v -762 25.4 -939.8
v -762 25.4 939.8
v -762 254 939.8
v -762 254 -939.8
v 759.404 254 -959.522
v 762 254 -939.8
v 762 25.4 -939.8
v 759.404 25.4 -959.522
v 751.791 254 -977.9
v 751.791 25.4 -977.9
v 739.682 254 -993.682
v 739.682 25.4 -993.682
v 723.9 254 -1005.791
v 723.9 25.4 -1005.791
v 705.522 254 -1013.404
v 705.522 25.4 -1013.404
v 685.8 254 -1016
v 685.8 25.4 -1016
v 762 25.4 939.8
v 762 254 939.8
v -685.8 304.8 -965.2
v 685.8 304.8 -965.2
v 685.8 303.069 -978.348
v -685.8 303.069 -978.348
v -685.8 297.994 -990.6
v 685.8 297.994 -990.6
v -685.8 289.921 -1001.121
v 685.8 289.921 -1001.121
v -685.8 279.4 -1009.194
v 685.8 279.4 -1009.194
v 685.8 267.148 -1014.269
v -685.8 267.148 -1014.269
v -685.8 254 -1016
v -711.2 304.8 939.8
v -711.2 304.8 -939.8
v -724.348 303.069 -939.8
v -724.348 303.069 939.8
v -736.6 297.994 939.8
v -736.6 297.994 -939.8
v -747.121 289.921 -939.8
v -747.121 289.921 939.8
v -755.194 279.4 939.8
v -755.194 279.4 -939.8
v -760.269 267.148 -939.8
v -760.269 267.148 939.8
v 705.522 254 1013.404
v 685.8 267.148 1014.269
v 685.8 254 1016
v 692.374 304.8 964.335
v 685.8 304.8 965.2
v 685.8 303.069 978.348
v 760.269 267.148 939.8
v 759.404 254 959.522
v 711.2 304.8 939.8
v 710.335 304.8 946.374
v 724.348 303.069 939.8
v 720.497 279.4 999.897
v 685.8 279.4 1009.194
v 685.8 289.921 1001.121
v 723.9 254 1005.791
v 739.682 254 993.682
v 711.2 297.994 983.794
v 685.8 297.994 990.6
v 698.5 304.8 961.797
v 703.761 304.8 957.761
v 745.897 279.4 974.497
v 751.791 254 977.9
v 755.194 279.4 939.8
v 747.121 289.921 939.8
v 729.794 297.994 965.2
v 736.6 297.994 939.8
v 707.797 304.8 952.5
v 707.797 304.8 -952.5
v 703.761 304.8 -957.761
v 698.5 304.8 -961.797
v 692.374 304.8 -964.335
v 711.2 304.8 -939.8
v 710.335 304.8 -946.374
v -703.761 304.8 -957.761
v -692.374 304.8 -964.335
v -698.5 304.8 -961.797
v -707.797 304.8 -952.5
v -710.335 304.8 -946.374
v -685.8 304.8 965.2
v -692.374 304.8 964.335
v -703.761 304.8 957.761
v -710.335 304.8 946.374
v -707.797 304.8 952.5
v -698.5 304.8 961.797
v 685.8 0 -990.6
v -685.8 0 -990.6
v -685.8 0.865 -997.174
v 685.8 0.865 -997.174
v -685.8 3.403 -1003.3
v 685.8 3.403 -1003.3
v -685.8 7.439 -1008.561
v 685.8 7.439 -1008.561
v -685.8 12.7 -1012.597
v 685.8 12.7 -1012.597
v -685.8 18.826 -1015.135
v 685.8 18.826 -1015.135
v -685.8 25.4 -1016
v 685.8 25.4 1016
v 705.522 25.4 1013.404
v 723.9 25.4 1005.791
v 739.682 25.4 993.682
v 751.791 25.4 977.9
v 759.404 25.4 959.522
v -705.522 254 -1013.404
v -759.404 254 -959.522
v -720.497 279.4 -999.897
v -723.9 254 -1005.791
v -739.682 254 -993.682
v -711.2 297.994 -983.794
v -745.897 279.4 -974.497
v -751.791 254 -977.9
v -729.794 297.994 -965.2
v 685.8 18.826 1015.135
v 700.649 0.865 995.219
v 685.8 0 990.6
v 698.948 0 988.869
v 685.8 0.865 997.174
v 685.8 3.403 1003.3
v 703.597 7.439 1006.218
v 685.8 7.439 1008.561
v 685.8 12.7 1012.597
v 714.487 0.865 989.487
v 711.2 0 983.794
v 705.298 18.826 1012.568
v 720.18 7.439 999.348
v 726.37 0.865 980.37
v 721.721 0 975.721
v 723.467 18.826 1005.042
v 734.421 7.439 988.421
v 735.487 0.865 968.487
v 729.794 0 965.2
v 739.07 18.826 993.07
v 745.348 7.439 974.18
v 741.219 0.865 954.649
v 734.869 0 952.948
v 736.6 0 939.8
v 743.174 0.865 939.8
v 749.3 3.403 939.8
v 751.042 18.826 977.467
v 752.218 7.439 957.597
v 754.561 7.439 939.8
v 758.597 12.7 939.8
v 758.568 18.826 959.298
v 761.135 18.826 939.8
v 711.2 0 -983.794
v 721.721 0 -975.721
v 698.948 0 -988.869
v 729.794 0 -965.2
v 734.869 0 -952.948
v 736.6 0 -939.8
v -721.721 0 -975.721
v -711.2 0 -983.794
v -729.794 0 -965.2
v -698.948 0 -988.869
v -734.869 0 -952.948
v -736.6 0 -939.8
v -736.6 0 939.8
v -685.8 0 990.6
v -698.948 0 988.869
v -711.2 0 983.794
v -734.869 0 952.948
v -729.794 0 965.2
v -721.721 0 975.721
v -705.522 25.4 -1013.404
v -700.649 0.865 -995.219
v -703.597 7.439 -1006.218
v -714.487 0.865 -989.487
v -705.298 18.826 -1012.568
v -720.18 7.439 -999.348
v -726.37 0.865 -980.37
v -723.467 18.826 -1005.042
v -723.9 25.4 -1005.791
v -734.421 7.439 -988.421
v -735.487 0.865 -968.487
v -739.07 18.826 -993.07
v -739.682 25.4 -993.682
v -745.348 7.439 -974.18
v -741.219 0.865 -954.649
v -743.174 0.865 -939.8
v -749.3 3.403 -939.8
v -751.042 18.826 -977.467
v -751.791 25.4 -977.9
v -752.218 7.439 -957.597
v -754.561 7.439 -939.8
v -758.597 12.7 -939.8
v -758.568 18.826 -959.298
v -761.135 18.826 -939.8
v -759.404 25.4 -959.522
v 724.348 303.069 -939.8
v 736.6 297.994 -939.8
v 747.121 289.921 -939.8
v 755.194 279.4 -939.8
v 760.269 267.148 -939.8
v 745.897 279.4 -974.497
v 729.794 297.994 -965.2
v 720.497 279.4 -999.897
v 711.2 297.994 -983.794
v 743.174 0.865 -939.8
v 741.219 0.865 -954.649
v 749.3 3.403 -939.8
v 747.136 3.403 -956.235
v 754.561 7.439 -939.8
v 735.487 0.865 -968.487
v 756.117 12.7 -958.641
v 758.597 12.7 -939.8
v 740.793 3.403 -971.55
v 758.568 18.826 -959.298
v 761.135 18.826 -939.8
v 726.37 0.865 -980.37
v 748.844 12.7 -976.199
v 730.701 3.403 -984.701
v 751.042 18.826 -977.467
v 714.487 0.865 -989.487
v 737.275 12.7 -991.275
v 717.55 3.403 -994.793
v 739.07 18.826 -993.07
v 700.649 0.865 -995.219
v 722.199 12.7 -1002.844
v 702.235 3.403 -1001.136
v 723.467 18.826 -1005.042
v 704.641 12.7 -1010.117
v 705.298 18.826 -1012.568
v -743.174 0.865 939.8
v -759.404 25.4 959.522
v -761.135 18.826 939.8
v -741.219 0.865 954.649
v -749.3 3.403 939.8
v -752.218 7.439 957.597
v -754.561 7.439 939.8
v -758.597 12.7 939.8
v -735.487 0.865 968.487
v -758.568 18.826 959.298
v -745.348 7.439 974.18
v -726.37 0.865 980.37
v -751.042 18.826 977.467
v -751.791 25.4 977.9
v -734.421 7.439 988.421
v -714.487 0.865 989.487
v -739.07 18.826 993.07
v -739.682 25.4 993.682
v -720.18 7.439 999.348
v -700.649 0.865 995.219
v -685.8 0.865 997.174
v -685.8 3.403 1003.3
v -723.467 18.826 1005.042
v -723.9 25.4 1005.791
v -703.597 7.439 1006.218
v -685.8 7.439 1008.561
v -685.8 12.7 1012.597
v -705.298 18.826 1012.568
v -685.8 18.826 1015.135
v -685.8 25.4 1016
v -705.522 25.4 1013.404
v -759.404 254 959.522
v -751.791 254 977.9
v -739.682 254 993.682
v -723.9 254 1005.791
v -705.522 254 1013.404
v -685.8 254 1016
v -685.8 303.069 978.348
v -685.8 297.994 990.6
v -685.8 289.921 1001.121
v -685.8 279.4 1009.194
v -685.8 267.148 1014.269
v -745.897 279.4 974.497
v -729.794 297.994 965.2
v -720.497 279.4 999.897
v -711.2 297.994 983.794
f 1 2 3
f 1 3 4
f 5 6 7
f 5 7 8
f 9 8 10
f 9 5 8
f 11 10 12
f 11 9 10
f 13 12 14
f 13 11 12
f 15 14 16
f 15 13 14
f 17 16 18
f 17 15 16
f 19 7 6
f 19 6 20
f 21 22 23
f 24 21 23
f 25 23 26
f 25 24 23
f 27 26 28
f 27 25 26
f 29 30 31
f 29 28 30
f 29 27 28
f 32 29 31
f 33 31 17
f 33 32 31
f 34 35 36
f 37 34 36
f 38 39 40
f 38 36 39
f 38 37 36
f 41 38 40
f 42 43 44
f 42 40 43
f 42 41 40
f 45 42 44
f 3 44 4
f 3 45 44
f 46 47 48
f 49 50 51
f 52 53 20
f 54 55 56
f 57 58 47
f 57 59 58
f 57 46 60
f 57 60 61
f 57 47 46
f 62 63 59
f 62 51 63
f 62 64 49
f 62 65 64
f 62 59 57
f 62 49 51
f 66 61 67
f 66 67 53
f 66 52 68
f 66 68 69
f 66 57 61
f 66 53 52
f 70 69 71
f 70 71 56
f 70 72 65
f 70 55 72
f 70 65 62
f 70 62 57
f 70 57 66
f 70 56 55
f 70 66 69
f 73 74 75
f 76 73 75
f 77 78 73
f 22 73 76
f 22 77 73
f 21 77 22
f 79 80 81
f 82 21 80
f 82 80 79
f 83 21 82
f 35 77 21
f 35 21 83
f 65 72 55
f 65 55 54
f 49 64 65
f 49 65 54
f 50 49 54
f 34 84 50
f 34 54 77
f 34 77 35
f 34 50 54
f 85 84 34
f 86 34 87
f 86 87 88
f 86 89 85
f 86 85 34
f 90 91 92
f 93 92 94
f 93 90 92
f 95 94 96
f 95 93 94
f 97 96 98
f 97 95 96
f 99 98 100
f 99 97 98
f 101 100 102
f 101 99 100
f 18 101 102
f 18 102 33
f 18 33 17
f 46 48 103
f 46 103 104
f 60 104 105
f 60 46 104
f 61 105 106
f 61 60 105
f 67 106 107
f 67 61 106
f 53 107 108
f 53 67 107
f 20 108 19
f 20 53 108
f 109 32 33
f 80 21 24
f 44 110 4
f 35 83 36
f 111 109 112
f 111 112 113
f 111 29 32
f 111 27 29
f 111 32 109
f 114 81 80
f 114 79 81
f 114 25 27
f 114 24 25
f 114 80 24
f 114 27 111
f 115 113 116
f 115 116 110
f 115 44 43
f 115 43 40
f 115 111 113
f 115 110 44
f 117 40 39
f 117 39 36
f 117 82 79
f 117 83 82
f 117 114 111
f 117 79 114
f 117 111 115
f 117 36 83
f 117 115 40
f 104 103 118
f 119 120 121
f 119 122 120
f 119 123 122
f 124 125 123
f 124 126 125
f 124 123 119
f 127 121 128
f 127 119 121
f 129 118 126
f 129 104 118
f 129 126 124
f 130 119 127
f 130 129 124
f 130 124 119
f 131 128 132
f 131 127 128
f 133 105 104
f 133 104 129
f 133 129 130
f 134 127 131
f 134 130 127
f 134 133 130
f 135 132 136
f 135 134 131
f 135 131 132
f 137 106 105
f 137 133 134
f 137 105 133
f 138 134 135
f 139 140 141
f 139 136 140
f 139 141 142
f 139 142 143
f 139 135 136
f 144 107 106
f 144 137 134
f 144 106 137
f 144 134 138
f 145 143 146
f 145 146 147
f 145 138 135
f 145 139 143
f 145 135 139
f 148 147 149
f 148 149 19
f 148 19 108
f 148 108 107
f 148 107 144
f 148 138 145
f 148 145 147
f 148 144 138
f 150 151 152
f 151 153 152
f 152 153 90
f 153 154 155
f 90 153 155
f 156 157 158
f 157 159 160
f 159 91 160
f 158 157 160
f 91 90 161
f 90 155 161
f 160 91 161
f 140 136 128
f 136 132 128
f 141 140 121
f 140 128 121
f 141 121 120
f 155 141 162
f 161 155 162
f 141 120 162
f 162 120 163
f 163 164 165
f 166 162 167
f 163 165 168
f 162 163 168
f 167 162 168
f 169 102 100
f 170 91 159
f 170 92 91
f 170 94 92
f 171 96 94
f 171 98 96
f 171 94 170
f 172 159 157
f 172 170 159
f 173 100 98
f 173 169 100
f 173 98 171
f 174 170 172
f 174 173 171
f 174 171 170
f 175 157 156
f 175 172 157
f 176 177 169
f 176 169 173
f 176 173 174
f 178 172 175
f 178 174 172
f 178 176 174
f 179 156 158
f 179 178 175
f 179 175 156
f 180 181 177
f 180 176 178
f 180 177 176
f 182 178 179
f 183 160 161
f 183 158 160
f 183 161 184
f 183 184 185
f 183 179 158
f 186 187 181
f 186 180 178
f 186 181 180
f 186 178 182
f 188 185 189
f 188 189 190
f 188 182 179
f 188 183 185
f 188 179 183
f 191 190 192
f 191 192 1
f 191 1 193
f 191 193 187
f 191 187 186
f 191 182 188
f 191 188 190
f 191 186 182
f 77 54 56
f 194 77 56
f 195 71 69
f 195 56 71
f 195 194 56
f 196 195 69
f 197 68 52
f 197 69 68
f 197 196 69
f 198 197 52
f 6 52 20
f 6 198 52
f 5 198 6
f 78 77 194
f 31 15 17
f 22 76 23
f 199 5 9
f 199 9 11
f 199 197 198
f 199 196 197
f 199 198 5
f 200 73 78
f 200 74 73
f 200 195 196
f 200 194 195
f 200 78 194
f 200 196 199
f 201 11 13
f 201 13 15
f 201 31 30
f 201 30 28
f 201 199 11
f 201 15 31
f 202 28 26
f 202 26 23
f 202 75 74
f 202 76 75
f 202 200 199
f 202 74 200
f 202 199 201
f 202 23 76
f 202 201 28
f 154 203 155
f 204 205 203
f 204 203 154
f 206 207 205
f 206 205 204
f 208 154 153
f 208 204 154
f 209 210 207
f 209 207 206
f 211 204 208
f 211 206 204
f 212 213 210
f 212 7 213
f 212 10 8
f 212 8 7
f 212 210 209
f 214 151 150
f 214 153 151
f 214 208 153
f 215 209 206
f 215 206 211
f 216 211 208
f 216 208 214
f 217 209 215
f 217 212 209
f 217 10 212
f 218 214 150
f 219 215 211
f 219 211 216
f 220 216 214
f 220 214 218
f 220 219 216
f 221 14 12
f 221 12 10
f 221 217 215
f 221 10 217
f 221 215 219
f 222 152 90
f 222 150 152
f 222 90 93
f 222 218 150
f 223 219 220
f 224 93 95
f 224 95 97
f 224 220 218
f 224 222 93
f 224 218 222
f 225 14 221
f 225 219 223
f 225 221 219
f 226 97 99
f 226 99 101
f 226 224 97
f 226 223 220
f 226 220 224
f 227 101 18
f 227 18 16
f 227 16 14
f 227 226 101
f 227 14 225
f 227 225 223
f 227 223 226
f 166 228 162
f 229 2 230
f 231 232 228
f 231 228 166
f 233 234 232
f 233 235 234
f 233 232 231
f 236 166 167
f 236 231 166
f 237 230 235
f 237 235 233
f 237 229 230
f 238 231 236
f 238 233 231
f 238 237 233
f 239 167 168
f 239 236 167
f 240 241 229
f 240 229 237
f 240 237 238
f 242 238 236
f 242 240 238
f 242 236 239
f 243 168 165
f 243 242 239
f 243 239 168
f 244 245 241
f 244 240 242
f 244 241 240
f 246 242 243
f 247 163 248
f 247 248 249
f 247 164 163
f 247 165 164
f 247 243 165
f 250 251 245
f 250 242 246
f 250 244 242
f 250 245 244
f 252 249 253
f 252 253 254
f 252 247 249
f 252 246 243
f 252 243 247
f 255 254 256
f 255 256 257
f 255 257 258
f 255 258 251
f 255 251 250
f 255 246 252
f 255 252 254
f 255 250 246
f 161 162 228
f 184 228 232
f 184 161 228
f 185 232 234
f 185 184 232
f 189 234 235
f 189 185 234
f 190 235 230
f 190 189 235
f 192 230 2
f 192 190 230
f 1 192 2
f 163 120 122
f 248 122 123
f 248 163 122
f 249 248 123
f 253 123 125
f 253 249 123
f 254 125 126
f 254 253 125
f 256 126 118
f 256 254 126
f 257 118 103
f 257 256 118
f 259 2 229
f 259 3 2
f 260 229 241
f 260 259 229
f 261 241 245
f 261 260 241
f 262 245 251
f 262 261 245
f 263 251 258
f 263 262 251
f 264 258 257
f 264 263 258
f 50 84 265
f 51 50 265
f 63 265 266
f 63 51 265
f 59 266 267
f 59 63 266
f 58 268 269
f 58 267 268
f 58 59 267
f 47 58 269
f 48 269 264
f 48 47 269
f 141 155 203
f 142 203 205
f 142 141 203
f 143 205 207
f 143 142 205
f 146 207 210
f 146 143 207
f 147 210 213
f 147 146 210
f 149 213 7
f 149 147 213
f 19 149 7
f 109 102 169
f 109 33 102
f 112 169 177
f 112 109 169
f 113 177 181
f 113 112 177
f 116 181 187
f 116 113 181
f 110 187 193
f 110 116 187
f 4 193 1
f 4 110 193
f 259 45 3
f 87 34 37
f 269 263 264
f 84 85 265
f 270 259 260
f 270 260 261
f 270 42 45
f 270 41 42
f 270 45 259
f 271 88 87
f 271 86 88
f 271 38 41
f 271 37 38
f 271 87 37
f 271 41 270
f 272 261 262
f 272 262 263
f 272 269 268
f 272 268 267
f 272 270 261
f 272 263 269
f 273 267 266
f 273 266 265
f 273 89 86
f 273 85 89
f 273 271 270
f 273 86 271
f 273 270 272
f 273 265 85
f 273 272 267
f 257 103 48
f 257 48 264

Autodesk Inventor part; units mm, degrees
ref_plane "YZ Plane" through (0, 0, 0) normal (1, 0, 0) x (0, 1, 0)
ref_plane "XZ Plane" through (0, 0, 0) normal (0, 1, 0) x (-1, 0, 0)
ref_plane "XY Plane" through (0, 0, 0) normal (0, 0, 1) x (1, 0, 0)
sketch "Sketch1" plane through (0, 0, 0) normal (0, 1, 0) x (-1, 0, 0)
  line L0 (-762, 1016) -> (762, 1016)
  line L1 (762, 1016) -> (762, -1016)
  line L2 (762, -1016) -> (-762, -1016)
  line L3 (-762, -1016) -> (-762, 1016)
  line L4 (-762, 1016) -> (762, -1016) construction
  line L5 (762, 1016) -> (-762, -1016) construction
  point P0 (0, 0)
  dimension "d0" = 1524
  dimension "d1" = 2032
extrude "Extrusion1" add sketch "Sketch1" along normal blind 304.8
fillet "Fillet1" radius 76.2 4 edges at (762, 152.4, 1016) (762, 152.4, -1016) (-762, 152.4, -1016) (-762, 152.4, 1016)
fillet "Fillet2" radius 50.8 8 edges at (739.6815, 304.8, 993.6815) (762, 304.8, 0) (739.6815, 304.8, -993.6815) (0, 304.8, -1016) (-739.6815, 304.8, -993.6815) (-762, 304.8, 0) (-739.6815, 304.8, 993.6815) (0, 304.8, 1016)
fillet "Fillet3" radius 25.4 8 edges at (-739.6815, 0, 993.6815) (-762, 0, 0) (-739.6815, 0, -993.6815) (0, 0, -1016) (739.6815, 0, -993.6815) (762, 0, 0) (739.6815, 0, 993.6815) (0, 0, 1016)
properties part number "Matress"
